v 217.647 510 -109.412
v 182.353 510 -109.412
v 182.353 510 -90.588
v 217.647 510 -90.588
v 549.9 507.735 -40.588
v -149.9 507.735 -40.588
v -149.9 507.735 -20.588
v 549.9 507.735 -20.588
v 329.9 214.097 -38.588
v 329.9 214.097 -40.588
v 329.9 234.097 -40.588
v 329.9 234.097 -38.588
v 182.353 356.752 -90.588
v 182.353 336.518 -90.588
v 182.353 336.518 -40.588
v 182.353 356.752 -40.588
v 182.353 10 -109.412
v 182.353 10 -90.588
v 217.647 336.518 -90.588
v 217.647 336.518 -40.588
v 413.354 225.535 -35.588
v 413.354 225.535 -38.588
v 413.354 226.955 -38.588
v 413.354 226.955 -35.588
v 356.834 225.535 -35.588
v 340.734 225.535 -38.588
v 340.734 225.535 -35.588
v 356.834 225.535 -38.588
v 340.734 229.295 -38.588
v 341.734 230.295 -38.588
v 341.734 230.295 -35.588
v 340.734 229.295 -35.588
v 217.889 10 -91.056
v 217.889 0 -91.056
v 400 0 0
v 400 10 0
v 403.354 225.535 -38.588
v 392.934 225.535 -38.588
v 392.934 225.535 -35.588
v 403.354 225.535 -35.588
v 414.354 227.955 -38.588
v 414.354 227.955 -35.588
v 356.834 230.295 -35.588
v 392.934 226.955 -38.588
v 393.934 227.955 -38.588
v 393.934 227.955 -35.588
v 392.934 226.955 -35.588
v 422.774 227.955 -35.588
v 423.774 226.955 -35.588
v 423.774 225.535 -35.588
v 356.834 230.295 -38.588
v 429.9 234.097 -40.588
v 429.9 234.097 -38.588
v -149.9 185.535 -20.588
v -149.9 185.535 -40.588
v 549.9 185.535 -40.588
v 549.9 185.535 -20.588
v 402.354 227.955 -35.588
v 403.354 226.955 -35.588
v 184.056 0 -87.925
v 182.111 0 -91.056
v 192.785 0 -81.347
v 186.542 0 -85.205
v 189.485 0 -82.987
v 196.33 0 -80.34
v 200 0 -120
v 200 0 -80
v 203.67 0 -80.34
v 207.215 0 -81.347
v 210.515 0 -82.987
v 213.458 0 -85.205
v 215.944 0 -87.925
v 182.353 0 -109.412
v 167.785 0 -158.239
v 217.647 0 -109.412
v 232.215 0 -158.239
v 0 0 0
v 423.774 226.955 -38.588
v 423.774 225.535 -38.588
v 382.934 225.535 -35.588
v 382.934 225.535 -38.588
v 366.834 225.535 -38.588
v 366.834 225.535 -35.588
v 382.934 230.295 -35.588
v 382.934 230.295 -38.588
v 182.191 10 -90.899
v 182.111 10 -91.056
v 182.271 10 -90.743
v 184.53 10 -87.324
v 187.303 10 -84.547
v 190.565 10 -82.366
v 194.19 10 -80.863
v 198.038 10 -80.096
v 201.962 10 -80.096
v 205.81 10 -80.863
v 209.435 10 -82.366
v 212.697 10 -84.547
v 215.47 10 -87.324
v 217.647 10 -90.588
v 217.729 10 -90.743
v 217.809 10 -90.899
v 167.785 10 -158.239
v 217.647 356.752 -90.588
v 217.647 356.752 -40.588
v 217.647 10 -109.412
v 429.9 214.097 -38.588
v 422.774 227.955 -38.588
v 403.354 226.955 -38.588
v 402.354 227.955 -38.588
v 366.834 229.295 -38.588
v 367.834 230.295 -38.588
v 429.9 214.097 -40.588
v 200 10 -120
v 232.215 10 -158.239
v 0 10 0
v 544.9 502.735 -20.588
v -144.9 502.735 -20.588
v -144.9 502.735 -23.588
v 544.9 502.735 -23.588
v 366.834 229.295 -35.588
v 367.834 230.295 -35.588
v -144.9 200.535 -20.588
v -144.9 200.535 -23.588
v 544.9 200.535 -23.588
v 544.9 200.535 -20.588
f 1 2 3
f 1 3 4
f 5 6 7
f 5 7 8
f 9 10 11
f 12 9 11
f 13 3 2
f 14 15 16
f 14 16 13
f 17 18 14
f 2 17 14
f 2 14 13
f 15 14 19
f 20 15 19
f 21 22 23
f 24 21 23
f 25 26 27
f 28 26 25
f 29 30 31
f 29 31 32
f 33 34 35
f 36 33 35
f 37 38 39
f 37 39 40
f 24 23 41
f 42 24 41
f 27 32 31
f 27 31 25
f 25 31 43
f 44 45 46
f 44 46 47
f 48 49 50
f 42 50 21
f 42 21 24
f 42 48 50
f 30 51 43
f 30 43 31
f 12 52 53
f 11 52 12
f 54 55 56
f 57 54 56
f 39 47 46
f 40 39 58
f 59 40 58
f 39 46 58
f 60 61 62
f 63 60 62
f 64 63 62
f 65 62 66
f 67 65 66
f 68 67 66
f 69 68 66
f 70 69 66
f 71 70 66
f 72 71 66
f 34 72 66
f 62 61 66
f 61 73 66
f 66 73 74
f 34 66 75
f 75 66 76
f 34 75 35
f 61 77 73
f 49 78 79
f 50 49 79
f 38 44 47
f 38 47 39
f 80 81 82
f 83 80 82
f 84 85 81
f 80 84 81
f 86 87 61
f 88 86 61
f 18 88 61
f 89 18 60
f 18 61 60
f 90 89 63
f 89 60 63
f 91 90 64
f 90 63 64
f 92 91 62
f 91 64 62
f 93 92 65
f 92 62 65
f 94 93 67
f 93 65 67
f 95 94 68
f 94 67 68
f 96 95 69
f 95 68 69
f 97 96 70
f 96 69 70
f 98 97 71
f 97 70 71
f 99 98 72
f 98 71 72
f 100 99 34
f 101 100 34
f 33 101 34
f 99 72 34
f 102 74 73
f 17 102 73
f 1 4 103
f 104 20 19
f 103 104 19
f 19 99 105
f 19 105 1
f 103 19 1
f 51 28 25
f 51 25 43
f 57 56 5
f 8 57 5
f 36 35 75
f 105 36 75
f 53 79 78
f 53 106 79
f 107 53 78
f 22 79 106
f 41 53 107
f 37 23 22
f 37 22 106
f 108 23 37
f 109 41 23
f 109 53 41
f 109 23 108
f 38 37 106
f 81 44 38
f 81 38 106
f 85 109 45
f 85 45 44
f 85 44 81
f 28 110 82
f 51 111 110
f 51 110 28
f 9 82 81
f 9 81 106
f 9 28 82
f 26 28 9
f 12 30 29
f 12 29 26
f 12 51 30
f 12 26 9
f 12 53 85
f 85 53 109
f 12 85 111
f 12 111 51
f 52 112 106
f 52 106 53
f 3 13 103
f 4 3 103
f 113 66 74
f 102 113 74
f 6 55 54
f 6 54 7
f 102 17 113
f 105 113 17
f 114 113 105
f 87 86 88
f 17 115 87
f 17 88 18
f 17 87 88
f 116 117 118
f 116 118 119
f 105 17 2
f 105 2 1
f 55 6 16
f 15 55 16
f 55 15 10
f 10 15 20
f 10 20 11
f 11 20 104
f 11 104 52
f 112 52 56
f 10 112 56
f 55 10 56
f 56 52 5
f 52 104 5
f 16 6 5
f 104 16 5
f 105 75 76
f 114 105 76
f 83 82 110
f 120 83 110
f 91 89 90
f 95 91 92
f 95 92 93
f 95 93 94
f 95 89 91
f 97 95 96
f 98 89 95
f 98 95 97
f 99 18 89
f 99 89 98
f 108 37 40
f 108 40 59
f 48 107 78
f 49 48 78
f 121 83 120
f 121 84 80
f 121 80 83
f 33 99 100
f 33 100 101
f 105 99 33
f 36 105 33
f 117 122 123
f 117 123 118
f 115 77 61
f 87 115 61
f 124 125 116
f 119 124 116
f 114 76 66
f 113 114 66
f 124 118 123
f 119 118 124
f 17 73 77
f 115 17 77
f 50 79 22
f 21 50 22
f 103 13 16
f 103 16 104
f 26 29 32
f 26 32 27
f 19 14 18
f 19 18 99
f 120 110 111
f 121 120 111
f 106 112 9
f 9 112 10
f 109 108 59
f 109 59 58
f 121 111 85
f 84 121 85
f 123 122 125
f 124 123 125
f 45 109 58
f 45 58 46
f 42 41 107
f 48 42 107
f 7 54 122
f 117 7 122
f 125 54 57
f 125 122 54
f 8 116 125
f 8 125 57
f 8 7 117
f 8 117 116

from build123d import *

# Parameters (mm, degrees)
BOSS_EXTRUDE1_DEPTH = 10
SKETCH6_W           = 35.294117648
SKETCH6_H           = 18.823529412
BOSS_EXTRUDE3_DEPTH = 500
SKETCH8_W           = 35.294117648
SKETCH8_H           = 20.234009988
BOSS_EXTRUDE4_DEPTH = 50
SKETCH9_W           = 699.8
SKETCH9_H           = 322.2
BOSS_EXTRUDE5_DEPTH = 20
SKETCH10_W          = 689.8
SKETCH10_H          = 302.2
CUT_EXTRUDE1_DEPTH  = 3
CUT_EXTRUDE6_DEPTH  = 5
SKETCH13_W          = 100
SKETCH13_H          = 20
CUT_EXTRUDE7_DEPTH  = 2


with BuildPart() as part:
    # Sketch1 → Boss-Extrude1 (new body)
    with BuildSketch(Plane(origin=(0, 0, 0), x_dir=(1, 0, 0), z_dir=(0, 1, 0))):
        with BuildLine():
            Line((0, 0), (182.11145618, 91.05572809))
            ThreePointArc((182.11145618, 91.05572809), (200, 80), (217.88854382, 91.05572809))
            Line((217.88854382, 91.05572809), (400, 0))
            Line((400, 0), (217.647058824, 109.411764706))
            Line((217.647058824, 109.411764706), (232.214563867, 158.239009858))
            Line((232.214563867, 158.239009858), (200, 120))
            Line((200, 120), (167.785436133, 158.239009858))
            Line((167.785436133, 158.239009858), (182.352941176, 109.411764706))
            Line((182.352941176, 109.411764706), (0, 0))
        make_face()
    extrude(amount=BOSS_EXTRUDE1_DEPTH)

    # Sketch6 → Boss-Extrude3 (add)
    with BuildSketch(Plane(origin=(0, 10, 0), x_dir=(1, 0, 0), z_dir=(0, 1, 0))):
        with Locations((200, 100)):
            Rectangle(SKETCH6_W, SKETCH6_H)
    extrude(amount=BOSS_EXTRUDE3_DEPTH)

    # Sketch8 → Boss-Extrude4 (add)
    with BuildSketch(Plane.XY.offset(-90.588235294)):
        with Locations((200, 346.635085086)):
            Rectangle(SKETCH8_W, SKETCH8_H)
    extrude(amount=BOSS_EXTRUDE4_DEPTH)

    # Sketch9 → Boss-Extrude5 (add)
    with BuildSketch(Plane.XY.offset(-40.588235294)):
        with Locations((200, 346.635085086)):
            Rectangle(SKETCH9_W, SKETCH9_H)
    extrude(amount=BOSS_EXTRUDE5_DEPTH)

    # Sketch10 → Cut-Extrude1 (cut)
    with BuildSketch(Plane.XY.offset(-20.588235294)):
        with Locations((200, 351.635085086)):
            Rectangle(SKETCH10_W, SKETCH10_H)
    extrude(amount=-CUT_EXTRUDE1_DEPTH, mode=Mode.SUBTRACT)

    # Sketch11 → Cut-Extrude6 (cut)
    with BuildSketch(Plane(origin=(0, 0, -40.588235294), x_dir=(-1, 0, 0), z_dir=(0, 0, -1))):
        Polygon((-392.933529412, 226.955085086), (-392.933529412, 225.535085086), (-403.353529412, 225.535085086), (-403.353529412, 226.955085086), (-402.353529412, 227.955085086), (-393.933529412, 227.955085086), align=None)
        Polygon((-366.833529412, 225.535085086), (-366.833529412, 229.295085086), (-367.833529412, 230.295085086), (-382.933529412, 230.295085086), (-382.933529412, 225.535085086), align=None)
        Polygon((-341.733529412, 230.295085086), (-340.733529412, 229.295085086), (-340.733529412, 225.535085086), (-356.833529412, 225.535085086), (-356.833529412, 230.295085086), align=None)
        Polygon((-423.773529412, 226.955085086), (-423.773529412, 225.535085086), (-413.353529412, 225.535085086), (-413.353529412, 226.955085086), (-414.353529412, 227.955085086), (-422.773529412, 227.955085086), align=None)
    extrude(amount=-CUT_EXTRUDE6_DEPTH, mode=Mode.SUBTRACT)

    # Sketch13 → Cut-Extrude7 (cut)
    with BuildSketch(Plane(origin=(0, 0, -40.588235294), x_dir=(-1, 0, 0), z_dir=(0, 0, -1))):
        with Locations((-379.9, 224.097206675)):
            Rectangle(SKETCH13_W, SKETCH13_H)
    extrude(amount=-CUT_EXTRUDE7_DEPTH, mode=Mode.SUBTRACT)


solid = part.part
